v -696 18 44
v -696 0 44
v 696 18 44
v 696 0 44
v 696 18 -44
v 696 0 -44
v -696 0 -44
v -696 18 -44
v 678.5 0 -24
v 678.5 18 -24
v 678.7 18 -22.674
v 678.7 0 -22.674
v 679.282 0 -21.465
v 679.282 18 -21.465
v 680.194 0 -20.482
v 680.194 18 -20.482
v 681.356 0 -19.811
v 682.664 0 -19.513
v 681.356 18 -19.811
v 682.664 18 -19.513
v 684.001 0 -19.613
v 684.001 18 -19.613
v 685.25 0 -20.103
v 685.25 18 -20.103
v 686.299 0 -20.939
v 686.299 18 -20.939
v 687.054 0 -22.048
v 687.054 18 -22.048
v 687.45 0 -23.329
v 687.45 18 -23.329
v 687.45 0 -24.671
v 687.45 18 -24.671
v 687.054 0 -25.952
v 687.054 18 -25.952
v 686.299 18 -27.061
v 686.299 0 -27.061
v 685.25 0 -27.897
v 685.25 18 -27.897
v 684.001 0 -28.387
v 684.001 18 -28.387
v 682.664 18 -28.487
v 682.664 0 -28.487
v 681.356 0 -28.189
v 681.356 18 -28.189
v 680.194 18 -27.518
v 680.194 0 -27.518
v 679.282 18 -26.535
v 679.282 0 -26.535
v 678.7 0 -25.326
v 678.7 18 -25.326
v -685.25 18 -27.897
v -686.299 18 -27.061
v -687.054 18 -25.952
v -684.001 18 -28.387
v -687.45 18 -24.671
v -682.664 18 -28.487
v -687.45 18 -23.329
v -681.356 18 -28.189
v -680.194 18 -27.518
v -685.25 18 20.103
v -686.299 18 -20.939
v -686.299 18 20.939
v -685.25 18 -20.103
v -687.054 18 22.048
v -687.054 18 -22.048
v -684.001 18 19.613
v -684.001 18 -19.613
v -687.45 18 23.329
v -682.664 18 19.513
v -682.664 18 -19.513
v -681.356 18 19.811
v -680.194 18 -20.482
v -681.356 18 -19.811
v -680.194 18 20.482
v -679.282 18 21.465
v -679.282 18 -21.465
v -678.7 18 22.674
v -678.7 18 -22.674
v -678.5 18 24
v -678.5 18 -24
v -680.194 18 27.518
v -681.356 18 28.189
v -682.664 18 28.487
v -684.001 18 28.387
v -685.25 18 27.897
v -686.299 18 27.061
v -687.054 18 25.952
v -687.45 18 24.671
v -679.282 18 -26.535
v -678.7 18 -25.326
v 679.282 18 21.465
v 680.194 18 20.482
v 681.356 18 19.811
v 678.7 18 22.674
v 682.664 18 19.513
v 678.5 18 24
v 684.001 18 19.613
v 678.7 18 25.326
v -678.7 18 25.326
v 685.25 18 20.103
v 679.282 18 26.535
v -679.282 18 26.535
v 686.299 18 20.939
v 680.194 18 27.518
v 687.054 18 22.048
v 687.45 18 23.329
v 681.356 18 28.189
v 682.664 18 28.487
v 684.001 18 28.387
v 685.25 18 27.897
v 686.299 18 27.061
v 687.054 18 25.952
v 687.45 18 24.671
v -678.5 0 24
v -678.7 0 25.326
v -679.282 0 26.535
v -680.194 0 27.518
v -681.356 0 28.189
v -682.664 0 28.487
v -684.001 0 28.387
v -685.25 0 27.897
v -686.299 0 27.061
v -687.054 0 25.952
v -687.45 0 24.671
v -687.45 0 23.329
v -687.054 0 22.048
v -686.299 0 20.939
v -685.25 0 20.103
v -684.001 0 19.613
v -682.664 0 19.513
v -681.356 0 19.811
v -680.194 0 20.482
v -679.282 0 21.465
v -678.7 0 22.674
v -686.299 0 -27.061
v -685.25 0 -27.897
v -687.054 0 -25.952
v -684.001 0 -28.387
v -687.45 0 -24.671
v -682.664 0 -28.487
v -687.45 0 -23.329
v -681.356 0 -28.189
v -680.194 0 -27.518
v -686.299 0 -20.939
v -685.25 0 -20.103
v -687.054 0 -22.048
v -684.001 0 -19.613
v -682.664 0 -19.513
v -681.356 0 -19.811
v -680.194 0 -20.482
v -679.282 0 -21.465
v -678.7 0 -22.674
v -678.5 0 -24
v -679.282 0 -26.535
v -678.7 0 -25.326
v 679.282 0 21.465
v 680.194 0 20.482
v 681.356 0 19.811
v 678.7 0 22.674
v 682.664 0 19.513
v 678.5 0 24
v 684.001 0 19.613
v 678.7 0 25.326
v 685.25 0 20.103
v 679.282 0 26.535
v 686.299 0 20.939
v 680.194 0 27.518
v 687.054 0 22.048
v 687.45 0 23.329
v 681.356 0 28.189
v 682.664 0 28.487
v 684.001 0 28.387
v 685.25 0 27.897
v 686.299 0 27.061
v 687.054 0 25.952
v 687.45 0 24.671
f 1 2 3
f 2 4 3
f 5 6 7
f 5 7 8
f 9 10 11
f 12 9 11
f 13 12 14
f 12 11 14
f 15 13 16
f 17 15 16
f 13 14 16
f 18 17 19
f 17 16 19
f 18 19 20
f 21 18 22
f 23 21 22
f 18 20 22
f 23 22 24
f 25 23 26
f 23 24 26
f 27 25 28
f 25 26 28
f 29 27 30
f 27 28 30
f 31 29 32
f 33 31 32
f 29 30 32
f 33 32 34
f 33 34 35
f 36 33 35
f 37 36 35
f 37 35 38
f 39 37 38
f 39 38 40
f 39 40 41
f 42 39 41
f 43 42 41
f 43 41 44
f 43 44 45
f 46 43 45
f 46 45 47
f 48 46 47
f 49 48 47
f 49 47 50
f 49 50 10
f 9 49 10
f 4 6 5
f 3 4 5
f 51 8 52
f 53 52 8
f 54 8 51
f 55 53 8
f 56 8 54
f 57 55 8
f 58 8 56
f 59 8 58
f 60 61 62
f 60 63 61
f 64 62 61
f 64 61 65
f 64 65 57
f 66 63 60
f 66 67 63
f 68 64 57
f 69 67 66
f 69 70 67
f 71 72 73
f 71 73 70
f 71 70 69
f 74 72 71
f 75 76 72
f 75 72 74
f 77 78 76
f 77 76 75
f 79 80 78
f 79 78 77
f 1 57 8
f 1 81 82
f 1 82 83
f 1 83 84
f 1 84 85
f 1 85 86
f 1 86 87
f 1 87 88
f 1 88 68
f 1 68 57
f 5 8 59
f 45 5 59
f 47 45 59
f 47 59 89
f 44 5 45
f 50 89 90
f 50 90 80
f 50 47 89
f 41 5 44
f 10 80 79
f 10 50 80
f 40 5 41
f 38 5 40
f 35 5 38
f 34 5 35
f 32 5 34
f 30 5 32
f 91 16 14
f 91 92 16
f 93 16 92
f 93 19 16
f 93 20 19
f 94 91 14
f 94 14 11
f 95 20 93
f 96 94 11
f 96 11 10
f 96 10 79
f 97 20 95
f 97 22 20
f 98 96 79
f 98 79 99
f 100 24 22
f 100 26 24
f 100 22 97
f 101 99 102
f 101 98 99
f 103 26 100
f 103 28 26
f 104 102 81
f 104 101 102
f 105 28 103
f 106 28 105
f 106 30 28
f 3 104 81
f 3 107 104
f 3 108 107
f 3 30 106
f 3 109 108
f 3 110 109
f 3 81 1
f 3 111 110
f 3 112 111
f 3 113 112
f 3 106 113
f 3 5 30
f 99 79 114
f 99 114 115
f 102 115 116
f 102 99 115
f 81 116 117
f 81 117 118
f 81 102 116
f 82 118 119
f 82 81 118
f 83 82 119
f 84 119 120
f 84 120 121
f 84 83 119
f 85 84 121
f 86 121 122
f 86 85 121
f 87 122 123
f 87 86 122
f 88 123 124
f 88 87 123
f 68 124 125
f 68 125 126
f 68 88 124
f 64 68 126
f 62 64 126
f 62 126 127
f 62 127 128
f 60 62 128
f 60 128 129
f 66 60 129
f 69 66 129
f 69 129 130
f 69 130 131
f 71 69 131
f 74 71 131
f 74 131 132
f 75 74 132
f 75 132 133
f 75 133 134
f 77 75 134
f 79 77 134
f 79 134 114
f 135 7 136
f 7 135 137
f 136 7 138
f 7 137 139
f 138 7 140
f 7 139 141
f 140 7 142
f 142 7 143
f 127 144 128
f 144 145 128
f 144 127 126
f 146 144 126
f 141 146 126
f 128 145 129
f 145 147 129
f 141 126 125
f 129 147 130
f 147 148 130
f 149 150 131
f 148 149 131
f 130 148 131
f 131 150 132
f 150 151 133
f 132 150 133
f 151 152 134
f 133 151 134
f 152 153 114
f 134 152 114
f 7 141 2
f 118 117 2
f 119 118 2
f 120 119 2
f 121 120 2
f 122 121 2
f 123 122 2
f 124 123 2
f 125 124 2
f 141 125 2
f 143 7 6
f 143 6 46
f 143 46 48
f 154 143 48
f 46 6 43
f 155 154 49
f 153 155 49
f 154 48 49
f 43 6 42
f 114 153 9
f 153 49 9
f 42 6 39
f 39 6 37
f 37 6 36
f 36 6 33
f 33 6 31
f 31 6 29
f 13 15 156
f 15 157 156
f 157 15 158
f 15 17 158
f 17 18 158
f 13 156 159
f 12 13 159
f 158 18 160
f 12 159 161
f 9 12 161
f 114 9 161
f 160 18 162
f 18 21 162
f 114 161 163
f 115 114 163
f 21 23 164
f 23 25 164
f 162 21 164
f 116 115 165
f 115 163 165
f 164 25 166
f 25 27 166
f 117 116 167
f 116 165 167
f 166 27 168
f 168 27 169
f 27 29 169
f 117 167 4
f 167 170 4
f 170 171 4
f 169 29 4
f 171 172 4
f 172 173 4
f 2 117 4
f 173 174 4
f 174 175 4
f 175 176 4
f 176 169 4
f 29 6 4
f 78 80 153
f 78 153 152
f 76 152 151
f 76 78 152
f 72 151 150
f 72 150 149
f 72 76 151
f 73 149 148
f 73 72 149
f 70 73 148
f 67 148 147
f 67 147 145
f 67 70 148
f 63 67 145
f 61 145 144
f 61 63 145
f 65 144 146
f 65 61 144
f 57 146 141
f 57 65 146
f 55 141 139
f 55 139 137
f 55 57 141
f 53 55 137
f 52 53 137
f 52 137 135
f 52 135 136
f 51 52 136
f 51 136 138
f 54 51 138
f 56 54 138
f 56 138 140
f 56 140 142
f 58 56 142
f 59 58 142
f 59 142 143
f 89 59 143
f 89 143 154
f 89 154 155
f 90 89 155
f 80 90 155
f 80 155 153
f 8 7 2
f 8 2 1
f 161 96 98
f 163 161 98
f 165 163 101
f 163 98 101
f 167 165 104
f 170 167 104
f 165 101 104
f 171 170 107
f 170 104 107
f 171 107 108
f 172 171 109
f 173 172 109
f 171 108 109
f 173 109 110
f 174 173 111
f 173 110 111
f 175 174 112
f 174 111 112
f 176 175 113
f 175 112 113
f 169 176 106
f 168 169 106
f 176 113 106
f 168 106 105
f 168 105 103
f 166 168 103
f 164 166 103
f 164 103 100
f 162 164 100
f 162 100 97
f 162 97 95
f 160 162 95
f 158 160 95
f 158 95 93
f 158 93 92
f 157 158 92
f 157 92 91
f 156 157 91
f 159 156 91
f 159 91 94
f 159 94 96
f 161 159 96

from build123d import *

# Parameters (mm, degrees)
F0_W     = 18
F0_H     = 88
F1_DEPTH = 696
F2_R     = 4.5
F3_DEPTH = 18.001


with BuildPart() as f1:
    # F0 (on Right) → F1 (new body)
    with BuildSketch(Plane.YZ):
        with Locations((9, 0)):
            Rectangle(F0_W, F0_H)
    extrude(amount=F1_DEPTH)

    # F2 (on face) → F3 (cut, through all)
    with BuildSketch(Plane(origin=(0, 18, 0), x_dir=(-1, 0, 0), z_dir=(0, 1, 0))):
        with Locations((-683, 24)):
            Circle(F2_R)
        with Locations((-683, -24)):
            Circle(F2_R)
    extrude(amount=-F3_DEPTH, mode=Mode.SUBTRACT)

    # F4: F1 across plane


with BuildPart() as f1_1:
    add(f1.part)
    add(f1.part.mirror(Plane.YZ))


solid = f1_1.part
